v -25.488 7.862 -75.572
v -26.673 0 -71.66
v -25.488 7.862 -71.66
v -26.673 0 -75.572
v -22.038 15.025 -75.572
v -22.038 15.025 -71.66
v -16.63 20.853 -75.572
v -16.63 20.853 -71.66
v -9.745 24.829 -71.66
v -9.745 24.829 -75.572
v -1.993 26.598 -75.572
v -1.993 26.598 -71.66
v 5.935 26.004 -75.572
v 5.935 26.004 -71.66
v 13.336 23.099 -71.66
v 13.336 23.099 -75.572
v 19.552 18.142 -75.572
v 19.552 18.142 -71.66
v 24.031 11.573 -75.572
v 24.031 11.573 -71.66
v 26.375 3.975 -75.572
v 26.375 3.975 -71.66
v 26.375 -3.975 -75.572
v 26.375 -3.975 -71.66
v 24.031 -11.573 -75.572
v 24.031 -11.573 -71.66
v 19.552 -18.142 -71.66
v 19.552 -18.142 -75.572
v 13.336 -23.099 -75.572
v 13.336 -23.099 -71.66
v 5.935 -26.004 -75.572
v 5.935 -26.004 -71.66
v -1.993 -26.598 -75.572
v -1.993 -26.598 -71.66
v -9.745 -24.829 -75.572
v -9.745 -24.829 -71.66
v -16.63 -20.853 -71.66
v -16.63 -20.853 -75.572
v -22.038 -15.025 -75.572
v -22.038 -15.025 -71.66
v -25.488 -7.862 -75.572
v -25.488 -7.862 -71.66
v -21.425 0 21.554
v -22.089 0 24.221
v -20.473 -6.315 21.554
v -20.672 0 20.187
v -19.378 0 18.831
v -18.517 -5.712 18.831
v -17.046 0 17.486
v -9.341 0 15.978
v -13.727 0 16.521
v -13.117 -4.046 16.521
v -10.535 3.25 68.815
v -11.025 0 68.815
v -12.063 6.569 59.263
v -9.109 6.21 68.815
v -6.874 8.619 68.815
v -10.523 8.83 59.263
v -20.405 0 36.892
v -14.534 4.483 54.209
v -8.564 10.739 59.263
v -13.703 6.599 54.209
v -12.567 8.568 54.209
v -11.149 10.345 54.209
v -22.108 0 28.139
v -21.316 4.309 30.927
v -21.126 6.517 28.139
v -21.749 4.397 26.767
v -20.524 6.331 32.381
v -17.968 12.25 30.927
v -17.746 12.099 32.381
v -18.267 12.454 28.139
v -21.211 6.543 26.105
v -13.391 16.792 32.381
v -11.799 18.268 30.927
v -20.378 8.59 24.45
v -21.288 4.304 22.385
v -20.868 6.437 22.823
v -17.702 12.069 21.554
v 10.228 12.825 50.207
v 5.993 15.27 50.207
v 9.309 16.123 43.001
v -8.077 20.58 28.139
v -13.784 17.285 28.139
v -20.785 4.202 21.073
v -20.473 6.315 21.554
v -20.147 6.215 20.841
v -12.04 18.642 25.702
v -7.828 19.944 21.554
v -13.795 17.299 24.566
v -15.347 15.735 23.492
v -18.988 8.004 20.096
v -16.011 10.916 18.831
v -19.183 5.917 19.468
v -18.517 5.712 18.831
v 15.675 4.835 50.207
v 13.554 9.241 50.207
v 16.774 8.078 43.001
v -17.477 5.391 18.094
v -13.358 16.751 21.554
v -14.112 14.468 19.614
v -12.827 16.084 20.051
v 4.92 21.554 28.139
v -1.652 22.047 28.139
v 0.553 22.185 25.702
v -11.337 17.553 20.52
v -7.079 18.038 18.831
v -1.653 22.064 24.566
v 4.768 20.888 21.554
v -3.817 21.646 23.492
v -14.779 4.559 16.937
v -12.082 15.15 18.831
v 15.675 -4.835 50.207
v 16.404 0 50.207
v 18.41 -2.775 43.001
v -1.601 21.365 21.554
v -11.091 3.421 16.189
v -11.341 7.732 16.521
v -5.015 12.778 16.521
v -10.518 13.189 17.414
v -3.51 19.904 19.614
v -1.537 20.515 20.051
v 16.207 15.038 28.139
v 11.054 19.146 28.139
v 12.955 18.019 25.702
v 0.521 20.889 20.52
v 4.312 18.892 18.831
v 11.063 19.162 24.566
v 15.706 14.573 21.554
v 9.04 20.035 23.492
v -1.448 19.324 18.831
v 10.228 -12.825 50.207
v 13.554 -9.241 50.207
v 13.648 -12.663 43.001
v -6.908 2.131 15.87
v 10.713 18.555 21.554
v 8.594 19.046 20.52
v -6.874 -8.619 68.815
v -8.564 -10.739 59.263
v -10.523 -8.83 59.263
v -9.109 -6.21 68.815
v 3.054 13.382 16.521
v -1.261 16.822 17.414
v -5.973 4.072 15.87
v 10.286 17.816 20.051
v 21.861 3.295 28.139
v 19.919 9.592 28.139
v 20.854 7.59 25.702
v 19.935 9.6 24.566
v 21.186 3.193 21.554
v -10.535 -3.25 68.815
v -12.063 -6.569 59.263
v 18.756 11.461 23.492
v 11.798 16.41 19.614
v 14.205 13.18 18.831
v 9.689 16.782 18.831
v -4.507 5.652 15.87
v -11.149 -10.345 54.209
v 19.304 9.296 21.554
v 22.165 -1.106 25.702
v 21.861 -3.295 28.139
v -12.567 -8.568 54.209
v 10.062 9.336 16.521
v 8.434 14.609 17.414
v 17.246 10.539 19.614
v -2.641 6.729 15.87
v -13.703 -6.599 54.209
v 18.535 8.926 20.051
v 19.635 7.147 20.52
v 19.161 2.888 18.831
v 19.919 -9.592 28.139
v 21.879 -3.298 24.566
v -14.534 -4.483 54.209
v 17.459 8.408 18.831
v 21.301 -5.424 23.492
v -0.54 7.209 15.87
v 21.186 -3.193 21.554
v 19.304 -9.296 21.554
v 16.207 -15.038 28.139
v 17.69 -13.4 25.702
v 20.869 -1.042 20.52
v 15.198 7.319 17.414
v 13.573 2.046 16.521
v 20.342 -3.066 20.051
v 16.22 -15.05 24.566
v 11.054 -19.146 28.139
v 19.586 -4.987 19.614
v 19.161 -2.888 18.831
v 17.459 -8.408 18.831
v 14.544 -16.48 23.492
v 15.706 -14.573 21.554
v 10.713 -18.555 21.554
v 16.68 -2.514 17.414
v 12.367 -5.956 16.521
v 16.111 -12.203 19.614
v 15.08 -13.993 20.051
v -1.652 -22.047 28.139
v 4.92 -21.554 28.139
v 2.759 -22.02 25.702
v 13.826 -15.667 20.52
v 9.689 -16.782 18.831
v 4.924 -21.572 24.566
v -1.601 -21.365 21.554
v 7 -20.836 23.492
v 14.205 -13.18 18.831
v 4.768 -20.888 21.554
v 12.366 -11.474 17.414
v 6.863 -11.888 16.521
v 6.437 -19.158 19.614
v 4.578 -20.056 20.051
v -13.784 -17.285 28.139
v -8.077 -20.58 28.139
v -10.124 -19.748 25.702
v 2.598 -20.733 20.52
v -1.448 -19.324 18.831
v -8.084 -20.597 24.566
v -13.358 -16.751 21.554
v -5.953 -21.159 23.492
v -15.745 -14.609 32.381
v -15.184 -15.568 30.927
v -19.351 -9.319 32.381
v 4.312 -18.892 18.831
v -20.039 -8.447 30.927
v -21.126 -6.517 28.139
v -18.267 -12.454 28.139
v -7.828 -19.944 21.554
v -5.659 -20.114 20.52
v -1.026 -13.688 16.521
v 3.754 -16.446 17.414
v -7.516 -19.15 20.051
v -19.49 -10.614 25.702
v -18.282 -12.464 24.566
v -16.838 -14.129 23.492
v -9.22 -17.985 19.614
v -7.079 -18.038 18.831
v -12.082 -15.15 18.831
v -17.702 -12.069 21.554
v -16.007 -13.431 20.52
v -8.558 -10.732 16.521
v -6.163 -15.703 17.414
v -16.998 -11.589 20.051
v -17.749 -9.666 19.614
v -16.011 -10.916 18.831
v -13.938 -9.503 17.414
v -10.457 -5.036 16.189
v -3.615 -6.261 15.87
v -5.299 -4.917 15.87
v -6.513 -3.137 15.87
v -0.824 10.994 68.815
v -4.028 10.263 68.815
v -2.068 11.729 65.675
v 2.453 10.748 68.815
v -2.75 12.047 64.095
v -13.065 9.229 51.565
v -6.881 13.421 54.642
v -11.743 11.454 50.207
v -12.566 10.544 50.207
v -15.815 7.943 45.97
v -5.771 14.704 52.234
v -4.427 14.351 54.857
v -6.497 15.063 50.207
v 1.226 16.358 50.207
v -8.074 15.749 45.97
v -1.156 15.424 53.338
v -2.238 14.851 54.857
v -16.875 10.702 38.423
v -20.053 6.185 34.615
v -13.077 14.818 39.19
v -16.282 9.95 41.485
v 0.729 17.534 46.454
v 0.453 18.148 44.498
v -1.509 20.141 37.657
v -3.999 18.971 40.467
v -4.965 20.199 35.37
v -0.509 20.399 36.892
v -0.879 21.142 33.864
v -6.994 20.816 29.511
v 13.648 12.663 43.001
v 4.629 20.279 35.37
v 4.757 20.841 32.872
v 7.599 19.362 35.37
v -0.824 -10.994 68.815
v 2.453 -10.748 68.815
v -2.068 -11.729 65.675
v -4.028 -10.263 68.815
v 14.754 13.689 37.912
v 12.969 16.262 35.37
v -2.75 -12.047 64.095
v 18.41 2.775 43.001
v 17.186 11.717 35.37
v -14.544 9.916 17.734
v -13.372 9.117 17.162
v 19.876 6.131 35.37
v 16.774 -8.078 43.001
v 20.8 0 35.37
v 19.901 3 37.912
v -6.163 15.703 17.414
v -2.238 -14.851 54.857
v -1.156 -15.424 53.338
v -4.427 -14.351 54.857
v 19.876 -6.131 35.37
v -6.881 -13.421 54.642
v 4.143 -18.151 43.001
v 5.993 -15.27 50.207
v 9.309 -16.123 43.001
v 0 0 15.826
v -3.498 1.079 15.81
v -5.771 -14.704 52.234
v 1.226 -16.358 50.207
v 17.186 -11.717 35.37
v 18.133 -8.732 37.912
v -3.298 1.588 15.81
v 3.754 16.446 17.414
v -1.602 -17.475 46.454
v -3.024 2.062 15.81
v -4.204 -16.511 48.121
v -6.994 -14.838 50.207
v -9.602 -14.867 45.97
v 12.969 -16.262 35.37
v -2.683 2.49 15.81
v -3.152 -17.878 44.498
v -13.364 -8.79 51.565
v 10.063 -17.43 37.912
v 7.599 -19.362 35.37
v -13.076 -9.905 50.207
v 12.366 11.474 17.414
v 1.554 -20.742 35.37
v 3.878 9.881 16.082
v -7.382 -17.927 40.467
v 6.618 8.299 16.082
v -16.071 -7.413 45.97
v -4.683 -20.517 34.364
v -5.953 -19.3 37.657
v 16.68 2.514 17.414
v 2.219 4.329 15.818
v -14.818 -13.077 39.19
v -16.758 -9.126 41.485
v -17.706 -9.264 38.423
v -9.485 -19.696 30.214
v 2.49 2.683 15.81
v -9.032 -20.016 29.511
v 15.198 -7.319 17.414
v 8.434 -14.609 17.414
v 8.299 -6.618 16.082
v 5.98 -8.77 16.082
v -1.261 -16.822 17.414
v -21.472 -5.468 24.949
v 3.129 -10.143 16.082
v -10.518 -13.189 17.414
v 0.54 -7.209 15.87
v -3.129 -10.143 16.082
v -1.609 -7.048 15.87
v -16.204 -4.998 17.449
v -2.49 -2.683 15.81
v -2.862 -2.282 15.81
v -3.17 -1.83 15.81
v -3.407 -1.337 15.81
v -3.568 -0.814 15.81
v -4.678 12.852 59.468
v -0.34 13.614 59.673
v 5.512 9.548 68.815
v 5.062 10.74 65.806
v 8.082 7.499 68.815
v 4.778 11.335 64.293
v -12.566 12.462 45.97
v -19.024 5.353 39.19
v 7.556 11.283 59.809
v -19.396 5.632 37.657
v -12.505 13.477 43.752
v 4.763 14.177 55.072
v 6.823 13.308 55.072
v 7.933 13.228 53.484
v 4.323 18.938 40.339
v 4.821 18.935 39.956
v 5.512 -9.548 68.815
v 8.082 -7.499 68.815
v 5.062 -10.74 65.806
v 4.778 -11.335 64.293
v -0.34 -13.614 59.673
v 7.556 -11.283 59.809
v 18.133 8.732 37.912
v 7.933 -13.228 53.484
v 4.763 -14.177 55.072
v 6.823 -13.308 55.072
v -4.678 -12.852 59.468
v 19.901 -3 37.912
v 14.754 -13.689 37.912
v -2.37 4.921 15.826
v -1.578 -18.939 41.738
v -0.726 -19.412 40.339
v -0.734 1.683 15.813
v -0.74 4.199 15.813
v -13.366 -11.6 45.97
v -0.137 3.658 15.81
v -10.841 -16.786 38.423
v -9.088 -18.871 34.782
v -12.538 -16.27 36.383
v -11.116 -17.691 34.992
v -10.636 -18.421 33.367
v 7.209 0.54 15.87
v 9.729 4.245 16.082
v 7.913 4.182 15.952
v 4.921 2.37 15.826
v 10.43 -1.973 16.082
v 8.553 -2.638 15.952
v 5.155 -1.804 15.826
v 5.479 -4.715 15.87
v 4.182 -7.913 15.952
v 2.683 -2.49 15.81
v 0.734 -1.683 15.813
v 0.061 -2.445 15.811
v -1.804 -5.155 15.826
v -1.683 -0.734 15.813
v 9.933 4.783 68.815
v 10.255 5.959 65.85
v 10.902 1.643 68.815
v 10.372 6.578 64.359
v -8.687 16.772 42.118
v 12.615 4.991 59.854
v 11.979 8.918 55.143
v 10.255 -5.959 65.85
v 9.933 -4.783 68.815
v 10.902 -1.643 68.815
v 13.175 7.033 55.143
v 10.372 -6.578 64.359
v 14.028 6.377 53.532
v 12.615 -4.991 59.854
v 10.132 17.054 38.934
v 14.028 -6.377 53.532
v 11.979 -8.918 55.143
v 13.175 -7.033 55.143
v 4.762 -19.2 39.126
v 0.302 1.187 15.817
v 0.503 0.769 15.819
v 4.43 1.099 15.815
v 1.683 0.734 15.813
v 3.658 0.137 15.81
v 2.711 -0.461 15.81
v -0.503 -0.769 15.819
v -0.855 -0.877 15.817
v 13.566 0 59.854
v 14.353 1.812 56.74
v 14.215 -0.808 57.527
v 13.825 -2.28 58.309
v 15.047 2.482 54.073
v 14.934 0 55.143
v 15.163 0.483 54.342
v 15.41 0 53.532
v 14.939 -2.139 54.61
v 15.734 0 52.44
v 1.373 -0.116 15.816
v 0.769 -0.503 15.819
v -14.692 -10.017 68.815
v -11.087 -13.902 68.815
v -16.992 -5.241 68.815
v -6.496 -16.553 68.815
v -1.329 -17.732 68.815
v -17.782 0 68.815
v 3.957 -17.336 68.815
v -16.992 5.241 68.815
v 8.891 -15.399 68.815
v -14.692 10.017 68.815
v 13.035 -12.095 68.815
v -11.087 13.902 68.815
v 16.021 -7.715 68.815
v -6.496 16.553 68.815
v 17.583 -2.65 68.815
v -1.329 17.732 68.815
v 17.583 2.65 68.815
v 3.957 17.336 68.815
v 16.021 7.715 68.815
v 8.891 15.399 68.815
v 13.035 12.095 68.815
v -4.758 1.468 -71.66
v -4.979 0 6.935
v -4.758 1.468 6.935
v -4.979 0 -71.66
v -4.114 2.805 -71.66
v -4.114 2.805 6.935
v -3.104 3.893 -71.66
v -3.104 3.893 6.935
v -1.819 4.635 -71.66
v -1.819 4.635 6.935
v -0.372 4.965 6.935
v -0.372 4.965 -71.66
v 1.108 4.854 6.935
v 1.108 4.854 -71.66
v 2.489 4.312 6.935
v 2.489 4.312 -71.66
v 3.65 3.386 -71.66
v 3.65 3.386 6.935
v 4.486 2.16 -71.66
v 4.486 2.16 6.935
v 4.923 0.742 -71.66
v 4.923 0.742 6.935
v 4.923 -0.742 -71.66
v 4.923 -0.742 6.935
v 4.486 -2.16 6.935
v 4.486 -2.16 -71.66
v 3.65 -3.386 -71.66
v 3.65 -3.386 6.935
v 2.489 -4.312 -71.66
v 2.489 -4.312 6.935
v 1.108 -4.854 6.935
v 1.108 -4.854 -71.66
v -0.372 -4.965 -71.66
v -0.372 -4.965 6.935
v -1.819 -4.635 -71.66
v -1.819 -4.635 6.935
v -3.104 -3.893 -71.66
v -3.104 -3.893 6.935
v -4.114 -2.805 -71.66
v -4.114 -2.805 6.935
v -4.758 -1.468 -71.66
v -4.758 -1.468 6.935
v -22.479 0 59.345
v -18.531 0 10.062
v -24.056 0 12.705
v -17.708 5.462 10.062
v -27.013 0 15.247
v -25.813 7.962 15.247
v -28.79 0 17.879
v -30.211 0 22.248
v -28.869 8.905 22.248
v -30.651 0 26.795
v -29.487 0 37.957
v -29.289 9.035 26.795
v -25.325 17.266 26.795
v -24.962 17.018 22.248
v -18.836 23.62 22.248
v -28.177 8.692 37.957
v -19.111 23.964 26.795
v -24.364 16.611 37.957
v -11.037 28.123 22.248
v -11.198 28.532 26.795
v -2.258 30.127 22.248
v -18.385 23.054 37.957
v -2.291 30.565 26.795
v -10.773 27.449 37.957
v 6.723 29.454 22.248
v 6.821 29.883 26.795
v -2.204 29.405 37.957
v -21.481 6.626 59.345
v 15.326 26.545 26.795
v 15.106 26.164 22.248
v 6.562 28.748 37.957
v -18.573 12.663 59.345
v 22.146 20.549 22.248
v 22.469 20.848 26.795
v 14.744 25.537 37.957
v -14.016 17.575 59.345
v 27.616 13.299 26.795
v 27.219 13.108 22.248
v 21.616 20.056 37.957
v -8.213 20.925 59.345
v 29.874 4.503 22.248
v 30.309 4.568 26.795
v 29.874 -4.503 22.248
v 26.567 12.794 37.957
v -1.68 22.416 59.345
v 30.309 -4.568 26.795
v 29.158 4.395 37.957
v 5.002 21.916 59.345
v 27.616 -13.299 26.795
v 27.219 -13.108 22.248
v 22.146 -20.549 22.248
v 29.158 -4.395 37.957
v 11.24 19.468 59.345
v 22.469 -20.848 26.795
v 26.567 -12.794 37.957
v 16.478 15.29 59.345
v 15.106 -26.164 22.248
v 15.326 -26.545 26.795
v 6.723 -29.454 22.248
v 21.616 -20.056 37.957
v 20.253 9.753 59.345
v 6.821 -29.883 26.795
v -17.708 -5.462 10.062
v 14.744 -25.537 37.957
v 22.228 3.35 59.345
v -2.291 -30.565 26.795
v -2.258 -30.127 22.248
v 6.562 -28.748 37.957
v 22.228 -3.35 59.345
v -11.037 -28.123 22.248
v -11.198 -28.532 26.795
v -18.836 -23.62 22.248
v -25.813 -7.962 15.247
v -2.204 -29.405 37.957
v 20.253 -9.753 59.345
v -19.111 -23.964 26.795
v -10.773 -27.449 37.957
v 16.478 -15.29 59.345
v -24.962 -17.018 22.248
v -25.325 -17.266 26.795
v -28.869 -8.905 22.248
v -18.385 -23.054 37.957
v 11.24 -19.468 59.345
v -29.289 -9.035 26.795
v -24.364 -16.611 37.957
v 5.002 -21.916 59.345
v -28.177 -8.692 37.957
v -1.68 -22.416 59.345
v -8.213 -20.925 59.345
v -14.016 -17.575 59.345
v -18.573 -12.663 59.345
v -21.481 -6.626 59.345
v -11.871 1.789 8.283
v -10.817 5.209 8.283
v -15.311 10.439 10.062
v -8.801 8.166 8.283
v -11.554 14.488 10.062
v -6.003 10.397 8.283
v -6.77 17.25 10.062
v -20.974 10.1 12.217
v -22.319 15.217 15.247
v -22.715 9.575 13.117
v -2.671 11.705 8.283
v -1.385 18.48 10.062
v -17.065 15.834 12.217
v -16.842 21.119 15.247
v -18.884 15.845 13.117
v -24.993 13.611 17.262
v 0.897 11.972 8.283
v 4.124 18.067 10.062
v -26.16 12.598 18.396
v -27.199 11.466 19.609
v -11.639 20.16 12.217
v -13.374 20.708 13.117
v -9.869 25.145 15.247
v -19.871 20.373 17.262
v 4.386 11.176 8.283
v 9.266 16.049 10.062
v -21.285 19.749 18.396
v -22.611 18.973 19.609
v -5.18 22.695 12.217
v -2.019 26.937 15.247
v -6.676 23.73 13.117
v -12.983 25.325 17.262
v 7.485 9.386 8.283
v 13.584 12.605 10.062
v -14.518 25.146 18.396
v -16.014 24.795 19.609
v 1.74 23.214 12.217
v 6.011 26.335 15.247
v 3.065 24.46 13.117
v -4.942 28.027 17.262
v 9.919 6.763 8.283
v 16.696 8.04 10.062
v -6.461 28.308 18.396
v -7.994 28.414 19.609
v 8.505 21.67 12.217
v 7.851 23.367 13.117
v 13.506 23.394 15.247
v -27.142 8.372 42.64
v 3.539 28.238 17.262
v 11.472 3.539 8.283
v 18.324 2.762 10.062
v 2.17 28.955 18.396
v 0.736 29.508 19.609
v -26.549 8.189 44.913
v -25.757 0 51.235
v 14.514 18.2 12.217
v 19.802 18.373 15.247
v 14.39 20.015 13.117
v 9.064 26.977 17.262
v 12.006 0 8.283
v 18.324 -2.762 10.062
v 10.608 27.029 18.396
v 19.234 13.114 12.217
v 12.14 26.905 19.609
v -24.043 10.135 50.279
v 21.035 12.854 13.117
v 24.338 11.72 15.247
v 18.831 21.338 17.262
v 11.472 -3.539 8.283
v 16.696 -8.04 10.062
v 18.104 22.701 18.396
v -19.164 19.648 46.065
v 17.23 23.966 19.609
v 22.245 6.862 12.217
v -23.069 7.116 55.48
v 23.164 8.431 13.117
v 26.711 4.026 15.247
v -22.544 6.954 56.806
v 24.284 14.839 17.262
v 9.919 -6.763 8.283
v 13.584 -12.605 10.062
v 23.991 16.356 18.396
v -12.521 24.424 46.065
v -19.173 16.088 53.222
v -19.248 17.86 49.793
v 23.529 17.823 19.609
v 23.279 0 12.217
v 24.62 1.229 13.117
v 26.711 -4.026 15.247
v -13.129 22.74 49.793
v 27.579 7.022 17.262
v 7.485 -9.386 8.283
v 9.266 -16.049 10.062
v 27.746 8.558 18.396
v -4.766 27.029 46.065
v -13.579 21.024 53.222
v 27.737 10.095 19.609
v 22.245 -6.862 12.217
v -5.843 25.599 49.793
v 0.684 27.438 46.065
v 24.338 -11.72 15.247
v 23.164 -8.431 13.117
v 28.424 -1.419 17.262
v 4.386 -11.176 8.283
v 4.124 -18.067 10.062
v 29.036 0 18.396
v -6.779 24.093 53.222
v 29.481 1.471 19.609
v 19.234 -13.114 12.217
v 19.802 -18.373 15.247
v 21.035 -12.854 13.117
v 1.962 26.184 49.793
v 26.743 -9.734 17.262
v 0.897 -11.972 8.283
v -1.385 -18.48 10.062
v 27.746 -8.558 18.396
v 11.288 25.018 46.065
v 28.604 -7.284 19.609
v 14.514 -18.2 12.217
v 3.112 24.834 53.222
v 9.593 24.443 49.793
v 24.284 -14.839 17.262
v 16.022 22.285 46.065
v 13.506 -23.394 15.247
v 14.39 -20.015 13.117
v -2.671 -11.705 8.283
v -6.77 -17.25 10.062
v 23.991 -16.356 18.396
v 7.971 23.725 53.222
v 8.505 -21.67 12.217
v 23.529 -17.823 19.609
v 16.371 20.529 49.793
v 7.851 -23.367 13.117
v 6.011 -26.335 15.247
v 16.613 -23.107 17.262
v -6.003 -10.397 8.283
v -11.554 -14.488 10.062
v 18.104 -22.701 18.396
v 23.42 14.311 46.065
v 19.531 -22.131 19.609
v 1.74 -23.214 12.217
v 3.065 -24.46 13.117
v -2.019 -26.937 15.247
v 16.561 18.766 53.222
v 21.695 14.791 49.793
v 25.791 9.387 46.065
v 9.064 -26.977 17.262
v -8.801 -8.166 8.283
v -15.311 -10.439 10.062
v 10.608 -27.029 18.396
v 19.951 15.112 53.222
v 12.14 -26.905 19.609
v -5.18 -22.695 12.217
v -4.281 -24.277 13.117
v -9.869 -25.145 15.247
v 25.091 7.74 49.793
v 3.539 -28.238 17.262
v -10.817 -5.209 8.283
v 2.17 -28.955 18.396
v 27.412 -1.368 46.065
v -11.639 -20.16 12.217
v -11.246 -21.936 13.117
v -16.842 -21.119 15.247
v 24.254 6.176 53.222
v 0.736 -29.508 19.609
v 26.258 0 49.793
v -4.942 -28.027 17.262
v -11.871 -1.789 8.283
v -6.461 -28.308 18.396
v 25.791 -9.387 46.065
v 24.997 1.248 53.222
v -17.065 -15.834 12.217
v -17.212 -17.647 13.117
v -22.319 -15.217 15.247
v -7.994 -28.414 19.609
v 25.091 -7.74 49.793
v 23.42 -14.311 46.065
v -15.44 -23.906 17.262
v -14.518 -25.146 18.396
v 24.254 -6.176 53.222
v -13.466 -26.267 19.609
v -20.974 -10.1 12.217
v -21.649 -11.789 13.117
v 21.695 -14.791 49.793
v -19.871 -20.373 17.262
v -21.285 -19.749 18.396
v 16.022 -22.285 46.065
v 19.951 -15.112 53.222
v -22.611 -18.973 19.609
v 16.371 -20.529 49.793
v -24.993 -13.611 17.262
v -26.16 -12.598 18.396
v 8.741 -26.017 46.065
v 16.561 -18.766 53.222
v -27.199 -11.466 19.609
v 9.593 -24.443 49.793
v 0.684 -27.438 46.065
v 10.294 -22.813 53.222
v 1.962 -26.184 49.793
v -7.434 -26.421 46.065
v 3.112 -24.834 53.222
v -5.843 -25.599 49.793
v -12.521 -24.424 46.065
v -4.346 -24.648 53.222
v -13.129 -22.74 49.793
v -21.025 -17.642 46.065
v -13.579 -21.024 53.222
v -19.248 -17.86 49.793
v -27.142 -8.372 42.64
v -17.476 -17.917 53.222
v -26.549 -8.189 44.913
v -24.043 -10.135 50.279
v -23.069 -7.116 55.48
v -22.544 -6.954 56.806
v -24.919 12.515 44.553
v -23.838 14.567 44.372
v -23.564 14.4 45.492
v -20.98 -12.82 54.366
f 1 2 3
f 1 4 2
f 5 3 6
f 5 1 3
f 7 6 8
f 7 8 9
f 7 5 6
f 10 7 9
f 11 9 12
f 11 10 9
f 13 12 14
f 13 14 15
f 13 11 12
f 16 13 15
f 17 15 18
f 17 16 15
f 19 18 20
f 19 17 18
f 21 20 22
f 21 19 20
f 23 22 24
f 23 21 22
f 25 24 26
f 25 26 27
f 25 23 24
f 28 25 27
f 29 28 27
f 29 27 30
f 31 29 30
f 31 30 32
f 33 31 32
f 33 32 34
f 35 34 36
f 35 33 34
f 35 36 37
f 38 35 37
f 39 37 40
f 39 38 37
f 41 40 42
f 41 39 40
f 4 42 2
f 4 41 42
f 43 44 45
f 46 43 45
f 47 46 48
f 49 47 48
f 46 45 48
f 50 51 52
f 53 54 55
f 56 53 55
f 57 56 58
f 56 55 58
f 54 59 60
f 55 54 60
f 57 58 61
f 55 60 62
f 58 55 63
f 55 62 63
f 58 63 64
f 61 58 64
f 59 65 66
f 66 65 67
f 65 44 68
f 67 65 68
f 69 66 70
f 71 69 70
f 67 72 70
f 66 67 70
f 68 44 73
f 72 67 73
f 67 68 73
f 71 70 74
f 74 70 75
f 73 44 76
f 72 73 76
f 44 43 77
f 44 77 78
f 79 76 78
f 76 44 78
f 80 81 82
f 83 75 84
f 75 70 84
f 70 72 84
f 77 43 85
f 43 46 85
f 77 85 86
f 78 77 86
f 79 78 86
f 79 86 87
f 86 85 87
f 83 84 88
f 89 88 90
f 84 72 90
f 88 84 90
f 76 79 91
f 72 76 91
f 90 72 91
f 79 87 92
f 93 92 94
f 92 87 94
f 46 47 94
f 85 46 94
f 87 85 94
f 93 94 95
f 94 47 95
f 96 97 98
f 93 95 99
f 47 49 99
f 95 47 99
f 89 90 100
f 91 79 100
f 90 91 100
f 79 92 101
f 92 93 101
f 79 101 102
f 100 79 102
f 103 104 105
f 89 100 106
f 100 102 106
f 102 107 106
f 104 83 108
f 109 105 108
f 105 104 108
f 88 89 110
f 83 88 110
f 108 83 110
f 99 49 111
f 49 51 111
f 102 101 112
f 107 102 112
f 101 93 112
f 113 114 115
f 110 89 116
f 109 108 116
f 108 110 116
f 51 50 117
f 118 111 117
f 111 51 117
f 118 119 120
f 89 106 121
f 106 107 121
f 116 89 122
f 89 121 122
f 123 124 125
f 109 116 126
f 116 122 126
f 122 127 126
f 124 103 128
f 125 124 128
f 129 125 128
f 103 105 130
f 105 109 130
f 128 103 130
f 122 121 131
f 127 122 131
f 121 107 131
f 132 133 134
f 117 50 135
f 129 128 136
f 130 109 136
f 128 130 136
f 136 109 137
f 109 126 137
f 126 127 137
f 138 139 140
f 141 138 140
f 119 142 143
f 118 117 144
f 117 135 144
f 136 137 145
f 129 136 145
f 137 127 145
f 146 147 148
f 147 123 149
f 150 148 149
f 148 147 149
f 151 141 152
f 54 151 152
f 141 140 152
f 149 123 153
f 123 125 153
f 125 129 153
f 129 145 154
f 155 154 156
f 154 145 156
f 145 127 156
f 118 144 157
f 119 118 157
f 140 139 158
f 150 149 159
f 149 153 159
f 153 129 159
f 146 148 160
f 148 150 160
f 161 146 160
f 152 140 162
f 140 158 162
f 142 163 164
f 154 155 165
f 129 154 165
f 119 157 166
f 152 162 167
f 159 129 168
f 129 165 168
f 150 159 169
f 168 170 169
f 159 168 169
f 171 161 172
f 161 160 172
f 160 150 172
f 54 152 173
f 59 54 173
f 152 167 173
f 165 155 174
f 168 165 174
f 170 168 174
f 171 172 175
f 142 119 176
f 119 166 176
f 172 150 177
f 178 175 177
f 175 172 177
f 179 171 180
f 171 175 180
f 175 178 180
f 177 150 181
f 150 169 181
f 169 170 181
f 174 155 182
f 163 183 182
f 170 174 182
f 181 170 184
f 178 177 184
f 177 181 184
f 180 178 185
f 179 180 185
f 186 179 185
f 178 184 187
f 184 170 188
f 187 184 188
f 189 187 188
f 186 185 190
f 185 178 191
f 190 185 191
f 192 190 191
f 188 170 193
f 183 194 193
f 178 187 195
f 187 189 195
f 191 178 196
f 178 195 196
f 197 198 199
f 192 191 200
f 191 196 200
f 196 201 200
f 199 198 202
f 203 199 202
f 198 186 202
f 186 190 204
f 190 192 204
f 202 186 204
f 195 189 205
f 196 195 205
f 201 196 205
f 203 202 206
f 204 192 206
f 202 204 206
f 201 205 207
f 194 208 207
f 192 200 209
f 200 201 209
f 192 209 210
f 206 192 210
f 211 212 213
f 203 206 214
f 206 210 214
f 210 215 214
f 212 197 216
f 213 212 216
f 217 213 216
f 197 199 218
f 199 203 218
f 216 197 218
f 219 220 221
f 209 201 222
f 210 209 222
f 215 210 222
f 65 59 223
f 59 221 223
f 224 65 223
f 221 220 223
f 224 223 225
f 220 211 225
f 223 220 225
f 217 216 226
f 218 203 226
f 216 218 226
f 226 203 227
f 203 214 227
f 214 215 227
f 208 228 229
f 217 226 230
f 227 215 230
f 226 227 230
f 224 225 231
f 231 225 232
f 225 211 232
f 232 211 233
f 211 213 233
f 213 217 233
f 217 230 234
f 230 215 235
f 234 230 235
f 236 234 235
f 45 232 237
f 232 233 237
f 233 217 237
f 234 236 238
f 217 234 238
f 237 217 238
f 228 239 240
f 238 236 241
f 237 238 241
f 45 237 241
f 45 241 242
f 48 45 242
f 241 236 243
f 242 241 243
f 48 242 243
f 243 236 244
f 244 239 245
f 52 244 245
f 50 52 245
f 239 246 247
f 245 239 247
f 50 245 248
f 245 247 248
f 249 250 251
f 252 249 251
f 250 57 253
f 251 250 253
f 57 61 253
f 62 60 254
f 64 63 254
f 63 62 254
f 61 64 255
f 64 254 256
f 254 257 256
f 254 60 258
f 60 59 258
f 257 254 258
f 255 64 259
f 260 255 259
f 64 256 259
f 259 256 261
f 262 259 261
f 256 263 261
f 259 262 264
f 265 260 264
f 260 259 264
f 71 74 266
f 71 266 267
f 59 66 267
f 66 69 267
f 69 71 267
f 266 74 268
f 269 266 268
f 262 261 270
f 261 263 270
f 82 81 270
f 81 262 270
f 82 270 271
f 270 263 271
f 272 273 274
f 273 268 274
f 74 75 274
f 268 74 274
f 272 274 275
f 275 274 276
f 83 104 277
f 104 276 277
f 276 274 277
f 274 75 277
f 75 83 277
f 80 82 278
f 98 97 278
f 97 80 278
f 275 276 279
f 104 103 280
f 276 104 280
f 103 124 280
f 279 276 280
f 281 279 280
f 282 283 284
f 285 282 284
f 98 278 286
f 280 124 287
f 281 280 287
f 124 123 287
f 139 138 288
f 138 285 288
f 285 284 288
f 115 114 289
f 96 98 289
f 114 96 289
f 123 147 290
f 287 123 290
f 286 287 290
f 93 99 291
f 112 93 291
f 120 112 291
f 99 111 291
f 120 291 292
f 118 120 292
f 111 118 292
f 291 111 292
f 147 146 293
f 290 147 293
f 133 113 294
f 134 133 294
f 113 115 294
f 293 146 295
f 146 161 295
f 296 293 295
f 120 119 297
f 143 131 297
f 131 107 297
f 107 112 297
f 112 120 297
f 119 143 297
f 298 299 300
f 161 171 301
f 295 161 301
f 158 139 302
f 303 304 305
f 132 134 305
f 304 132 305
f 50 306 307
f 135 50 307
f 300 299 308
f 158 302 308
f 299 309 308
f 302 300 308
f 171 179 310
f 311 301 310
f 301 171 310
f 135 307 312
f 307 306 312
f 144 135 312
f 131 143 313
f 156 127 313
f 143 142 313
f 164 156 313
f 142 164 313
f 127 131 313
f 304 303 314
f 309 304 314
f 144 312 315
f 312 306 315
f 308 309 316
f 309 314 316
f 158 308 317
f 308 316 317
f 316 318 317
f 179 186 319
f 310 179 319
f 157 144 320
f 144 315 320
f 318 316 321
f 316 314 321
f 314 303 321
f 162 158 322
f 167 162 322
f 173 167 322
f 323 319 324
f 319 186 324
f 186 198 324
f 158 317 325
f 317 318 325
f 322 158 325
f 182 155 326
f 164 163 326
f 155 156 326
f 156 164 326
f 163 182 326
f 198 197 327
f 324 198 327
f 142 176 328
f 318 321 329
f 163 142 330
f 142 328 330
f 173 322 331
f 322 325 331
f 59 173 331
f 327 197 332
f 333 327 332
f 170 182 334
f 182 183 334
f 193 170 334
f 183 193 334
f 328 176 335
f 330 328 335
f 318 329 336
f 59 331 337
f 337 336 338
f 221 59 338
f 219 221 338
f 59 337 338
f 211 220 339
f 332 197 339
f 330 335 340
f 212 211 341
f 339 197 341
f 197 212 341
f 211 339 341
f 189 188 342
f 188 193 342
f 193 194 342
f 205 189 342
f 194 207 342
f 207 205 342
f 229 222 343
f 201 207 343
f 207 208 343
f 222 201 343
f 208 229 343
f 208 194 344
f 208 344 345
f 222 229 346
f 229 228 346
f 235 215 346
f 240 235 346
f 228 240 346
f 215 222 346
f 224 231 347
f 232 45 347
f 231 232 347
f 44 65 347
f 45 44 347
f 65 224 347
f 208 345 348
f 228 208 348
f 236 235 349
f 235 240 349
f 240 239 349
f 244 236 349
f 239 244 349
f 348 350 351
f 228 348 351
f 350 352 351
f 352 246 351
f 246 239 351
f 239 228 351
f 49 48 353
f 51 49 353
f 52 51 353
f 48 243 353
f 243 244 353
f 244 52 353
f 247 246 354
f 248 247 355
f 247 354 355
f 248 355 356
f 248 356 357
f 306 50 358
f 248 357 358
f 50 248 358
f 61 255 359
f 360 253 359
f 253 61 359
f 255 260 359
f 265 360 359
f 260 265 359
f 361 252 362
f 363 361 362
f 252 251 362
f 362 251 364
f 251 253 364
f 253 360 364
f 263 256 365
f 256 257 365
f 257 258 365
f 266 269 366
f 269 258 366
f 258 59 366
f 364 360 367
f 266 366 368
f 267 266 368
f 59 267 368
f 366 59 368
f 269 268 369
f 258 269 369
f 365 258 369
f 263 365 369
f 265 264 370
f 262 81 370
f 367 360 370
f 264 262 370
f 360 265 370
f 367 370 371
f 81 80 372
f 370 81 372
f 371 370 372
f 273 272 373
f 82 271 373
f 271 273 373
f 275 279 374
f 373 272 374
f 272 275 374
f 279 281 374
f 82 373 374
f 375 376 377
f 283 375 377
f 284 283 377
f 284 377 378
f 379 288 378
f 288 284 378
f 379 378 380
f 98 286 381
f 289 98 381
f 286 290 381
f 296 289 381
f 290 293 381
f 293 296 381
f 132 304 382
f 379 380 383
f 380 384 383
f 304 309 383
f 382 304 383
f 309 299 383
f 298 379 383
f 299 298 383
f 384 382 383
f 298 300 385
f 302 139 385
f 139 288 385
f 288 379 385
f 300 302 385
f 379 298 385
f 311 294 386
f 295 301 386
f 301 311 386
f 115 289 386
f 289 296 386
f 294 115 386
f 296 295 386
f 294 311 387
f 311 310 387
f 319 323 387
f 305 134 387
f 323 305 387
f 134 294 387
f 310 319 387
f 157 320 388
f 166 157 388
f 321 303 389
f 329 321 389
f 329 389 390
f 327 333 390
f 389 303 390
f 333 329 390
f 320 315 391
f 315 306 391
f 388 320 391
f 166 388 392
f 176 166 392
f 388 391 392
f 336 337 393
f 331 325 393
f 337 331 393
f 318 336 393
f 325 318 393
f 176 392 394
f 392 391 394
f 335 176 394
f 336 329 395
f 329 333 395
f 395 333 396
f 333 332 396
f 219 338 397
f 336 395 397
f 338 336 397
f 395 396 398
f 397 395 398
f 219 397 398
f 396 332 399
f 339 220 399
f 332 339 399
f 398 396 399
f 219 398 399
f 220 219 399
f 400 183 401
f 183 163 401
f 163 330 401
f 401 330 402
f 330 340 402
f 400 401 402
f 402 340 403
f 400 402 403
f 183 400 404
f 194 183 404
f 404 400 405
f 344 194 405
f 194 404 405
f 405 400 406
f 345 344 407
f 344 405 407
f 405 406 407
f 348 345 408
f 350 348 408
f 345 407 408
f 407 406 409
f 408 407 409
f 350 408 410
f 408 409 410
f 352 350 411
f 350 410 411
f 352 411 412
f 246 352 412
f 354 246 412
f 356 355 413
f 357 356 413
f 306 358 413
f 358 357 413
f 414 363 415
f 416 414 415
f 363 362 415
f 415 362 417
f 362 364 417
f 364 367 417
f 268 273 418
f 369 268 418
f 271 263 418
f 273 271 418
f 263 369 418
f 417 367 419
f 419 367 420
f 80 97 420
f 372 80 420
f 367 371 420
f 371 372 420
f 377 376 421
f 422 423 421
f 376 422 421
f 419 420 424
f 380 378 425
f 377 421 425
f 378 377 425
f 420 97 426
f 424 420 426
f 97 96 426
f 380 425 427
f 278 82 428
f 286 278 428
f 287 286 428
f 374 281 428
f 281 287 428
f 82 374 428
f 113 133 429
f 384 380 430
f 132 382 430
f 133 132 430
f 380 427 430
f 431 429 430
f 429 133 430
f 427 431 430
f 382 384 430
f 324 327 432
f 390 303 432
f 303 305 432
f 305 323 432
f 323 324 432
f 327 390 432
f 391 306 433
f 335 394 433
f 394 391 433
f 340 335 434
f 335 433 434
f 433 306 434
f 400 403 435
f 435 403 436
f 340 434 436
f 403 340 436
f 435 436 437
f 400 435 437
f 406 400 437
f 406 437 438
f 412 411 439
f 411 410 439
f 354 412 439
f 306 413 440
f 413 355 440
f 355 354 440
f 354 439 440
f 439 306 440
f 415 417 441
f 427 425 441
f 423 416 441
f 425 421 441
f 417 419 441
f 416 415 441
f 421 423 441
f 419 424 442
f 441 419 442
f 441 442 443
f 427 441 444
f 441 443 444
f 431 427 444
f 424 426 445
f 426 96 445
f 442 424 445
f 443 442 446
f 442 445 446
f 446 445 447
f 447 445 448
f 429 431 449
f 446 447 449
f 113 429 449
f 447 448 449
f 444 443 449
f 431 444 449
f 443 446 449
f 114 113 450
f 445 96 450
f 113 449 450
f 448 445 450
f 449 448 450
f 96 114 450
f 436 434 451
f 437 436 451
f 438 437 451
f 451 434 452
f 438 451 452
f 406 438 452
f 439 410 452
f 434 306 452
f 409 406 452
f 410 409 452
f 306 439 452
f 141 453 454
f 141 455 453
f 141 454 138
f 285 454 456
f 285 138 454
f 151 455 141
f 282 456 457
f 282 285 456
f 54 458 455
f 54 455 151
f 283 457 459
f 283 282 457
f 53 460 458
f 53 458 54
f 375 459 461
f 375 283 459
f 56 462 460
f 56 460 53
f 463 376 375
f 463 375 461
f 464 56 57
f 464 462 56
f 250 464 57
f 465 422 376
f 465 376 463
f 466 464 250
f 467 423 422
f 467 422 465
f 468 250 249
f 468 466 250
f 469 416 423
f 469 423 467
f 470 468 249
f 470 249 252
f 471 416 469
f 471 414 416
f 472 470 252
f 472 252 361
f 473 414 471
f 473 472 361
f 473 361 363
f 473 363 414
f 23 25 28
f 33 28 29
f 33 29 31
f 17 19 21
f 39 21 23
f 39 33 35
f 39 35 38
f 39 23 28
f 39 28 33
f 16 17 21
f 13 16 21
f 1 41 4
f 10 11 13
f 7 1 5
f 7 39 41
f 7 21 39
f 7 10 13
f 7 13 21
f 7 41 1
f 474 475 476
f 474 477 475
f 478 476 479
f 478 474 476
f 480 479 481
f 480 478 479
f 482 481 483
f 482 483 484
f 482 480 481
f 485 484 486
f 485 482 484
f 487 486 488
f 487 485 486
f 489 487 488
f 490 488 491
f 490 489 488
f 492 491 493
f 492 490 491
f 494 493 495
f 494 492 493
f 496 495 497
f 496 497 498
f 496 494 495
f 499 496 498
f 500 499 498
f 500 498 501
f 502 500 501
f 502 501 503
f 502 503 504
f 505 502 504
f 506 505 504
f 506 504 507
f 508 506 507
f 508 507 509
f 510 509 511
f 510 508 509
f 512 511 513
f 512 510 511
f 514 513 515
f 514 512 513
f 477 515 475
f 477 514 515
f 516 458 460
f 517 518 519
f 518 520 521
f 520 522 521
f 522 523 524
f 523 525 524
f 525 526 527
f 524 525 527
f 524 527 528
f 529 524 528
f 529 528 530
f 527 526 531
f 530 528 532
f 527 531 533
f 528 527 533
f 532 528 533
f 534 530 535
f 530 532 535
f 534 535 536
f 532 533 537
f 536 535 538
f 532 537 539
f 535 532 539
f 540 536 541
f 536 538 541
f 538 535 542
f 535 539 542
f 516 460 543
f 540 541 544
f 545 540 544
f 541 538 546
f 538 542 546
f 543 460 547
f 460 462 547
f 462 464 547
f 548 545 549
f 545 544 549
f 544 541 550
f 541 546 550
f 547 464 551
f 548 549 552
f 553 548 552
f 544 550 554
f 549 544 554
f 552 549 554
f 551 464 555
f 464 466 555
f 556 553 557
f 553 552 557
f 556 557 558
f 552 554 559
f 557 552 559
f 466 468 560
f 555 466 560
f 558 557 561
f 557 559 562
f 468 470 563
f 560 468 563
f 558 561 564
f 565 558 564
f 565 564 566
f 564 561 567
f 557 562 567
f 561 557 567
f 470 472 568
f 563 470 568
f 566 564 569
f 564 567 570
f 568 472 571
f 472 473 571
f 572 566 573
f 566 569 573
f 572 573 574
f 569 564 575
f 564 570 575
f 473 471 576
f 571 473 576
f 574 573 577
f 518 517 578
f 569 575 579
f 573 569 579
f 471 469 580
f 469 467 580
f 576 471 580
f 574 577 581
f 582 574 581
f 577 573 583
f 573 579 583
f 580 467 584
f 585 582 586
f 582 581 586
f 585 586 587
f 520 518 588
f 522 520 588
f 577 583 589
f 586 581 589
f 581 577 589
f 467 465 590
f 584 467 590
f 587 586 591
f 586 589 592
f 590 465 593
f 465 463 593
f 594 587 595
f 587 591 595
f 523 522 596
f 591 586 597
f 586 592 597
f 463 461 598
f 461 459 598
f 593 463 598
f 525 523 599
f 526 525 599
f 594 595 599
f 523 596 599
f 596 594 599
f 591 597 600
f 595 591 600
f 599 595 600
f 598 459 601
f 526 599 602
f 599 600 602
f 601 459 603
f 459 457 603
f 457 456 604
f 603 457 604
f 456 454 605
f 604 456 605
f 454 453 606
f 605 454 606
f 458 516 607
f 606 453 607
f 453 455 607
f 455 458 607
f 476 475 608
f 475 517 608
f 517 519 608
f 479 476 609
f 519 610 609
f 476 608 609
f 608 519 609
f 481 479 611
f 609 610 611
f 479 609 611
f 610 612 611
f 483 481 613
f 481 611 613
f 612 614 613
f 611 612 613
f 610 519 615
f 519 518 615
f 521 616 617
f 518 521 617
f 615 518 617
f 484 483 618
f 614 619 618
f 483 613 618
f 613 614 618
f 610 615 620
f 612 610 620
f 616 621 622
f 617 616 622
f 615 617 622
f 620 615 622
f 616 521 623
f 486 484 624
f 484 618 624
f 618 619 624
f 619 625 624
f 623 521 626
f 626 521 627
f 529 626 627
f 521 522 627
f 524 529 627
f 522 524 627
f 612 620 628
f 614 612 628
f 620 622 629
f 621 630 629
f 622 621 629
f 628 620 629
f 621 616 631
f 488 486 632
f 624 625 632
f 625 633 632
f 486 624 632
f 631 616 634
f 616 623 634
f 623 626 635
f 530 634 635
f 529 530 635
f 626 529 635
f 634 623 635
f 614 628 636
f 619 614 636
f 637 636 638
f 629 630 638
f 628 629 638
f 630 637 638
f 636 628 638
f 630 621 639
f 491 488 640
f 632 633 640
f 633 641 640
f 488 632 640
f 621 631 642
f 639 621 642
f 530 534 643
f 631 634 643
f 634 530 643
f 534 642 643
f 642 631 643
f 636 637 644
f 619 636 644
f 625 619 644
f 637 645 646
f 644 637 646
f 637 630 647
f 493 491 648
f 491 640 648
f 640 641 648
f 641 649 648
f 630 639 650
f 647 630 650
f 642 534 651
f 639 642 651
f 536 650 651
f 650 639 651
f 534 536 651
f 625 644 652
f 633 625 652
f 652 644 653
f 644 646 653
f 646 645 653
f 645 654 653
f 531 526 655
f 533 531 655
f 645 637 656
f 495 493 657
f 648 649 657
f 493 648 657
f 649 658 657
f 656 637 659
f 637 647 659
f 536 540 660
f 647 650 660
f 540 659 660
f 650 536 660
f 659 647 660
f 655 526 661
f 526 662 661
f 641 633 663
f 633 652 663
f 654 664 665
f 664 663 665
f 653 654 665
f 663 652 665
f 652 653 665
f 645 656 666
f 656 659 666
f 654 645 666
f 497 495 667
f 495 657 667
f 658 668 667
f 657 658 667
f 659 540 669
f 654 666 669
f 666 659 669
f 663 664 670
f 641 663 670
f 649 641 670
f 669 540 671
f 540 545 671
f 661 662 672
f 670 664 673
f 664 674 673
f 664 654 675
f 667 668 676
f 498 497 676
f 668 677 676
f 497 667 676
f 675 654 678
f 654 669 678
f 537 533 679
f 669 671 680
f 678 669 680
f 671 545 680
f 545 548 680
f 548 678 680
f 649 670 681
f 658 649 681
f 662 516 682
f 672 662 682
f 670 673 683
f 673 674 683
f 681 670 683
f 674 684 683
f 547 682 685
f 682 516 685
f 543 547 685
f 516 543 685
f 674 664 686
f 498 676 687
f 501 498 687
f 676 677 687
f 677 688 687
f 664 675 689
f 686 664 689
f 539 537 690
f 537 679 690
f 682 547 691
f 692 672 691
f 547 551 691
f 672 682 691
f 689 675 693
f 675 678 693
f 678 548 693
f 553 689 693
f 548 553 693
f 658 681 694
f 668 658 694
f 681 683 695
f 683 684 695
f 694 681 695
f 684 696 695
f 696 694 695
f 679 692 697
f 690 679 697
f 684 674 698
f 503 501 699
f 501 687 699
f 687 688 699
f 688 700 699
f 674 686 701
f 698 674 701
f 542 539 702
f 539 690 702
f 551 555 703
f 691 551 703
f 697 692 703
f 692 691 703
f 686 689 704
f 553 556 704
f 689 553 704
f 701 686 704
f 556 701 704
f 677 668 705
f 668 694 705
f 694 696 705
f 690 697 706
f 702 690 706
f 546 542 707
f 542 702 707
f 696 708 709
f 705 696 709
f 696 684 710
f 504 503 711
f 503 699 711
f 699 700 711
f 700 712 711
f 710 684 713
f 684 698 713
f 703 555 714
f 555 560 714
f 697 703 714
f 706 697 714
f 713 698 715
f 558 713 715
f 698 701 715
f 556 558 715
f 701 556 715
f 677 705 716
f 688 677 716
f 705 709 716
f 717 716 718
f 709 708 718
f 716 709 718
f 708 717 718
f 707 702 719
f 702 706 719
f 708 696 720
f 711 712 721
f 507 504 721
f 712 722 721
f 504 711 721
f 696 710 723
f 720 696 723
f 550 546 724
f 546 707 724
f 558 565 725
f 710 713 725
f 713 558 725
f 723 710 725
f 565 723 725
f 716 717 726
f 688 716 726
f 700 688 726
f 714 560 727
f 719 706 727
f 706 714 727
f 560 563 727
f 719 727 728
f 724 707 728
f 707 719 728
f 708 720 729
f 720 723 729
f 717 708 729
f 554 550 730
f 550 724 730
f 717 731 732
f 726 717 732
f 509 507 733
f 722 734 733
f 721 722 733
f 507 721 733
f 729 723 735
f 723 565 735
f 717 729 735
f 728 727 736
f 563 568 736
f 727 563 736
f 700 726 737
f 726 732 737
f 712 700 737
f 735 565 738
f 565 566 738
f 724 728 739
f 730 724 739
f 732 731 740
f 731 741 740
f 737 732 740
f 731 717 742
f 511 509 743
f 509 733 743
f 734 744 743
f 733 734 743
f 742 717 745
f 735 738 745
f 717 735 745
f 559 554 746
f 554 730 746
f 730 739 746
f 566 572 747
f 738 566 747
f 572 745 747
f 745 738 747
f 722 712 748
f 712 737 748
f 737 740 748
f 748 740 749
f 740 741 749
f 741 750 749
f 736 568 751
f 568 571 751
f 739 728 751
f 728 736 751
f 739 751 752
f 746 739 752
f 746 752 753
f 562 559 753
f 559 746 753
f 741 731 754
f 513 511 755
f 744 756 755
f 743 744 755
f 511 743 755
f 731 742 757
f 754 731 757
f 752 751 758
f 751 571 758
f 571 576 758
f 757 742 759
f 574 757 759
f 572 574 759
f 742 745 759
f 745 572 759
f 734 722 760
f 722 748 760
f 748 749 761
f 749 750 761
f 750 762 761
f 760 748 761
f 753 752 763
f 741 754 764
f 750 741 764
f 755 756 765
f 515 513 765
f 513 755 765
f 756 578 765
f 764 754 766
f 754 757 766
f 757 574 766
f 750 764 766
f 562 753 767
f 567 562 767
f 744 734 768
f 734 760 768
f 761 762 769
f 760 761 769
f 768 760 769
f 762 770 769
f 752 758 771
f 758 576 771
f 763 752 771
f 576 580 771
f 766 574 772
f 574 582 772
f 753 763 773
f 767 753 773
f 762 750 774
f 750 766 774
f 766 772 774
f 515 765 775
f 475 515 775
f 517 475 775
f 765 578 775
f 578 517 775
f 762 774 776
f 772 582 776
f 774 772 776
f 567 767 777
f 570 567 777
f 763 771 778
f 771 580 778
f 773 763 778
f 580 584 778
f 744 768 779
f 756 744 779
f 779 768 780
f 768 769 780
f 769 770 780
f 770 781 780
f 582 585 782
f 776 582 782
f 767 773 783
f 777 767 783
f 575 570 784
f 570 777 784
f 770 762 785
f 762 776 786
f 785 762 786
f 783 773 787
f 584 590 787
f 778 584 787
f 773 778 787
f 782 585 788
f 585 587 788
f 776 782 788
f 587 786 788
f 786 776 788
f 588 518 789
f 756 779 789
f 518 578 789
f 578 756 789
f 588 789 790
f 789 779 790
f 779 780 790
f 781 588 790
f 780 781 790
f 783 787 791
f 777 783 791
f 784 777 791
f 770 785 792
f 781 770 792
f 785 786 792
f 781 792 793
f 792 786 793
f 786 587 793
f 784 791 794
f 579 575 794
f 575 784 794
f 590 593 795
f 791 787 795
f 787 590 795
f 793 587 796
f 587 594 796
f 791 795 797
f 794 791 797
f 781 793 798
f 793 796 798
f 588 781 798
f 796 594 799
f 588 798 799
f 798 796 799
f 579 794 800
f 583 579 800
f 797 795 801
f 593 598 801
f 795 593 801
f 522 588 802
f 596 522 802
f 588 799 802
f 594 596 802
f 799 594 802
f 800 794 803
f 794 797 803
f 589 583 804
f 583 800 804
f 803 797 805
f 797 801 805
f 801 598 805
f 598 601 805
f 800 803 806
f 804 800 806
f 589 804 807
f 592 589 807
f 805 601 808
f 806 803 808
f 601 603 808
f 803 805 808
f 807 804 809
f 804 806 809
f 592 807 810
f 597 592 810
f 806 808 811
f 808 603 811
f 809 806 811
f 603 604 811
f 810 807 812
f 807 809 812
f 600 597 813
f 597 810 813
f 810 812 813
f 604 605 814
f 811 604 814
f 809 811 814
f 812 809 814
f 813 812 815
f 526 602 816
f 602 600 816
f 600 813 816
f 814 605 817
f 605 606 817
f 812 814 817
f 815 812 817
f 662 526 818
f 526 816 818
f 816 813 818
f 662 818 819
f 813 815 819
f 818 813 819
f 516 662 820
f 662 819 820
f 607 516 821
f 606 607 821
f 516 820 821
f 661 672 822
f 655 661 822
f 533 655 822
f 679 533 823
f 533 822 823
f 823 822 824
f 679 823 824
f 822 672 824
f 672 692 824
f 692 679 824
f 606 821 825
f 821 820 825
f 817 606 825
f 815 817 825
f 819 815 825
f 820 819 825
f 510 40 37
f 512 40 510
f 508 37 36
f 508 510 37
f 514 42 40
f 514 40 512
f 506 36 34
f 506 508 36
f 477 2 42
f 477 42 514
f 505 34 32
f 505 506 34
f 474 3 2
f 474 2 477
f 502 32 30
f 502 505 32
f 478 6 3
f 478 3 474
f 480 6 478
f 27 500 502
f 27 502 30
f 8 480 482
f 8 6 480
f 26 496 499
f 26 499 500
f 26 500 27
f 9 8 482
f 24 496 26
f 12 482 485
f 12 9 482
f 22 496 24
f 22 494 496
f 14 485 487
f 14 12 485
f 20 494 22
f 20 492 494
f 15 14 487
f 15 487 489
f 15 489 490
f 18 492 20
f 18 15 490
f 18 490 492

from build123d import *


with BuildPart() as f1:
    # F0 (on Front) → F1 (revolve)
    with BuildSketch(Plane.XZ):
        with BuildLine():
            Line((-26.6725718975, -75.5722820759), (0, -75.5722820759))
            Line((0, -75.5722820759), (0, 15.8257279545))
            add(Edge.make_bspline(
                [(-11.0246650875, 68.8152387738), (-13.0319182183, 61.6892423346), (-17.1020054937, 47.2399299955), (-27.4894427467, 15.6142705276), (-8.8924216575, 15.7573246544), (0, 15.8257279545)],
                knots=[0, 0, 0, 0, 0.3367714548, 0.6828681405, 1, 1, 1, 1], degree=3))
            Line((-11.0246650875, 68.8152387738), (-17.7817139775, 68.8152387738))
            add(Edge.make_bspline(
                [(-4.9788798206, 6.9348705001), (-14.7560330129, 8.6892290012), (-35.3441774531, 12.3834522081), (-27.5698066923, 49.9831757822), (-20.8500701315, 62.9117928158), (-17.7817139775, 68.8152387738)],
                knots=[0, 0, 0, 0, 0.3294975078, 0.6938361452, 1, 1, 1, 1], degree=3))
            Line((-4.9788798206, 6.9348705001), (-4.9788798206, -71.6603025794))
            Line((-4.9788798206, -71.6603025794), (-26.6725718975, -71.6603025794))
            Line((-26.6725718975, -71.6603025794), (-26.6725718975, -75.5722820759))
        make_face()
    revolve(axis=Axis((0, 0, -1.244712621), (0, 0, -1)))


solid = f1.part
